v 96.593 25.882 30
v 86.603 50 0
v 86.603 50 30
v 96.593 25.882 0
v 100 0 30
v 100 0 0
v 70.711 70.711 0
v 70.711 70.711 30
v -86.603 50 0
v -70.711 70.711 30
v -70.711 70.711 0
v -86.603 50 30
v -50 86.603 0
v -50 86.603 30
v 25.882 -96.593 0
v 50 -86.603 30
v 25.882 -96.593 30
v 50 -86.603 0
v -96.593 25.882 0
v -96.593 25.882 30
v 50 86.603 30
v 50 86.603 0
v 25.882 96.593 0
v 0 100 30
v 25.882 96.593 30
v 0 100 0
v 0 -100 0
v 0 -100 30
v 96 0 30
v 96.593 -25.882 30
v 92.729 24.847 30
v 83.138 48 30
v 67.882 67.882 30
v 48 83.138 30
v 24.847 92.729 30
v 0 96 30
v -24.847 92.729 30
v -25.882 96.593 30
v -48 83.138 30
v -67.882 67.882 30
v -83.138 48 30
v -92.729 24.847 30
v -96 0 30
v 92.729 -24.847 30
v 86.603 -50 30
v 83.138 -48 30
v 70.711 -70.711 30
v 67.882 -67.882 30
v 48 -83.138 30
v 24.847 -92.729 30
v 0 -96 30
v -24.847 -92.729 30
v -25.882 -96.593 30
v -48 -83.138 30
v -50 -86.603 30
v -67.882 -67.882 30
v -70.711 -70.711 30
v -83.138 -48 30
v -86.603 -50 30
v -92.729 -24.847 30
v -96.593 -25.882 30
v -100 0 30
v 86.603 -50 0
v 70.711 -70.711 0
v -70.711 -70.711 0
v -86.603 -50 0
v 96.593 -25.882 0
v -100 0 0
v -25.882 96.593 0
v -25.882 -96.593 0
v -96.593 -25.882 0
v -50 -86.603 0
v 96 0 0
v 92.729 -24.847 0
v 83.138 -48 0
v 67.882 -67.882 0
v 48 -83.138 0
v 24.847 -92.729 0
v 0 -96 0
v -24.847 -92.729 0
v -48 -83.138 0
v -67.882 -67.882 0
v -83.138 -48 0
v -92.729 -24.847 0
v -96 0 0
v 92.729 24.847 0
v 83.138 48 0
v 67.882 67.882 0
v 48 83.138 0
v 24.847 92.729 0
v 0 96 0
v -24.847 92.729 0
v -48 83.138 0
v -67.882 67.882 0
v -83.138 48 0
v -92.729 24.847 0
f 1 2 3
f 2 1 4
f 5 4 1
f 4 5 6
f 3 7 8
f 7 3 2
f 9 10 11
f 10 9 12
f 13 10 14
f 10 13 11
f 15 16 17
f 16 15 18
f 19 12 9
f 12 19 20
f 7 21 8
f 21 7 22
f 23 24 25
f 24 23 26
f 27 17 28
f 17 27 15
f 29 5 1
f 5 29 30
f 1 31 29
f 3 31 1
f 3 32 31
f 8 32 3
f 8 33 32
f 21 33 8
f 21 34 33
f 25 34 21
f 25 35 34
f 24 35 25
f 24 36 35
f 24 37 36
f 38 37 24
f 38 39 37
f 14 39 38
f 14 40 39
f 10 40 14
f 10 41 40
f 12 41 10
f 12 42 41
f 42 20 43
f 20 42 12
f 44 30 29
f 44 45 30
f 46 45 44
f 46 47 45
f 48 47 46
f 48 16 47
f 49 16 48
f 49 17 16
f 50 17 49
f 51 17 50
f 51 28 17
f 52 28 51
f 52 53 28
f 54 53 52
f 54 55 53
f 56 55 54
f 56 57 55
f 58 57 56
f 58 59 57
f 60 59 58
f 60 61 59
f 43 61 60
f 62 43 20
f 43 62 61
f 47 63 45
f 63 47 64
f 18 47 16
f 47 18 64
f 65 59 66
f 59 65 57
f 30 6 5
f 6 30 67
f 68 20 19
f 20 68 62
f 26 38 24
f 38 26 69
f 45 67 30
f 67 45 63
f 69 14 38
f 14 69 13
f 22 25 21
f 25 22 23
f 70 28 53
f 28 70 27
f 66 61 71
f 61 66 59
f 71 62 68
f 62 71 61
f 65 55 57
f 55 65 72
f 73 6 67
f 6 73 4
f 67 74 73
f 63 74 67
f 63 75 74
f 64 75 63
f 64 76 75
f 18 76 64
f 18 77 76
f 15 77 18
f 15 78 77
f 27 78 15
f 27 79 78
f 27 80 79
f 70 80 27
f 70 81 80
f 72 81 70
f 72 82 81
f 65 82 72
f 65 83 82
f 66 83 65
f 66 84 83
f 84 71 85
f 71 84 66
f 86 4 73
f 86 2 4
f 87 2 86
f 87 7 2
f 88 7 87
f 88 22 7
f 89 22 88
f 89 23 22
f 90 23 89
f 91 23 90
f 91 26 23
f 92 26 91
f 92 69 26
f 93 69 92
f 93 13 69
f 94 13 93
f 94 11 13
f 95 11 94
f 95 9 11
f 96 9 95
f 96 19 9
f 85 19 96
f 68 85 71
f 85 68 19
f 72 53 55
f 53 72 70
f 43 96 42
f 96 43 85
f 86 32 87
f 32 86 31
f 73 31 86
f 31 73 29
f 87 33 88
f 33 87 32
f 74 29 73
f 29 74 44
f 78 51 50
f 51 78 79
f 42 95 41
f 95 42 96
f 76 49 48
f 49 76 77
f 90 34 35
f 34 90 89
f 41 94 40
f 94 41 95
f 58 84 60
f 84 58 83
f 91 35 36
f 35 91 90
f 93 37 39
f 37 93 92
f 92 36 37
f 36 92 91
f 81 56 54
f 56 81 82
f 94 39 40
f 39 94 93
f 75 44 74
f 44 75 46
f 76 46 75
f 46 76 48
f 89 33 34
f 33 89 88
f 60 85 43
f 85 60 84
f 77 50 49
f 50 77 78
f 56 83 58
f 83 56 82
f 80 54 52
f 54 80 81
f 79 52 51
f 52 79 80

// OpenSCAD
//
// The Chimnea Cover
//
// The bottom ring itself is a trivially simple. It's just a ring.
// It locks the parts together and centers the cover in the chimney of chimnea.

ring_fn = 24;
ring_dia = 200.0;
tab_dia_bot = ring_dia - 8.0;

module main () {

    difference () {
        cylinder(30.0, ring_dia/2, ring_dia/2, $fn=ring_fn);

        translate([0, 0, -0.1])
            cylinder(30.0 + 0.2, tab_dia_bot/2, tab_dia_bot/2, $fn=ring_fn);
    }
}

main();
